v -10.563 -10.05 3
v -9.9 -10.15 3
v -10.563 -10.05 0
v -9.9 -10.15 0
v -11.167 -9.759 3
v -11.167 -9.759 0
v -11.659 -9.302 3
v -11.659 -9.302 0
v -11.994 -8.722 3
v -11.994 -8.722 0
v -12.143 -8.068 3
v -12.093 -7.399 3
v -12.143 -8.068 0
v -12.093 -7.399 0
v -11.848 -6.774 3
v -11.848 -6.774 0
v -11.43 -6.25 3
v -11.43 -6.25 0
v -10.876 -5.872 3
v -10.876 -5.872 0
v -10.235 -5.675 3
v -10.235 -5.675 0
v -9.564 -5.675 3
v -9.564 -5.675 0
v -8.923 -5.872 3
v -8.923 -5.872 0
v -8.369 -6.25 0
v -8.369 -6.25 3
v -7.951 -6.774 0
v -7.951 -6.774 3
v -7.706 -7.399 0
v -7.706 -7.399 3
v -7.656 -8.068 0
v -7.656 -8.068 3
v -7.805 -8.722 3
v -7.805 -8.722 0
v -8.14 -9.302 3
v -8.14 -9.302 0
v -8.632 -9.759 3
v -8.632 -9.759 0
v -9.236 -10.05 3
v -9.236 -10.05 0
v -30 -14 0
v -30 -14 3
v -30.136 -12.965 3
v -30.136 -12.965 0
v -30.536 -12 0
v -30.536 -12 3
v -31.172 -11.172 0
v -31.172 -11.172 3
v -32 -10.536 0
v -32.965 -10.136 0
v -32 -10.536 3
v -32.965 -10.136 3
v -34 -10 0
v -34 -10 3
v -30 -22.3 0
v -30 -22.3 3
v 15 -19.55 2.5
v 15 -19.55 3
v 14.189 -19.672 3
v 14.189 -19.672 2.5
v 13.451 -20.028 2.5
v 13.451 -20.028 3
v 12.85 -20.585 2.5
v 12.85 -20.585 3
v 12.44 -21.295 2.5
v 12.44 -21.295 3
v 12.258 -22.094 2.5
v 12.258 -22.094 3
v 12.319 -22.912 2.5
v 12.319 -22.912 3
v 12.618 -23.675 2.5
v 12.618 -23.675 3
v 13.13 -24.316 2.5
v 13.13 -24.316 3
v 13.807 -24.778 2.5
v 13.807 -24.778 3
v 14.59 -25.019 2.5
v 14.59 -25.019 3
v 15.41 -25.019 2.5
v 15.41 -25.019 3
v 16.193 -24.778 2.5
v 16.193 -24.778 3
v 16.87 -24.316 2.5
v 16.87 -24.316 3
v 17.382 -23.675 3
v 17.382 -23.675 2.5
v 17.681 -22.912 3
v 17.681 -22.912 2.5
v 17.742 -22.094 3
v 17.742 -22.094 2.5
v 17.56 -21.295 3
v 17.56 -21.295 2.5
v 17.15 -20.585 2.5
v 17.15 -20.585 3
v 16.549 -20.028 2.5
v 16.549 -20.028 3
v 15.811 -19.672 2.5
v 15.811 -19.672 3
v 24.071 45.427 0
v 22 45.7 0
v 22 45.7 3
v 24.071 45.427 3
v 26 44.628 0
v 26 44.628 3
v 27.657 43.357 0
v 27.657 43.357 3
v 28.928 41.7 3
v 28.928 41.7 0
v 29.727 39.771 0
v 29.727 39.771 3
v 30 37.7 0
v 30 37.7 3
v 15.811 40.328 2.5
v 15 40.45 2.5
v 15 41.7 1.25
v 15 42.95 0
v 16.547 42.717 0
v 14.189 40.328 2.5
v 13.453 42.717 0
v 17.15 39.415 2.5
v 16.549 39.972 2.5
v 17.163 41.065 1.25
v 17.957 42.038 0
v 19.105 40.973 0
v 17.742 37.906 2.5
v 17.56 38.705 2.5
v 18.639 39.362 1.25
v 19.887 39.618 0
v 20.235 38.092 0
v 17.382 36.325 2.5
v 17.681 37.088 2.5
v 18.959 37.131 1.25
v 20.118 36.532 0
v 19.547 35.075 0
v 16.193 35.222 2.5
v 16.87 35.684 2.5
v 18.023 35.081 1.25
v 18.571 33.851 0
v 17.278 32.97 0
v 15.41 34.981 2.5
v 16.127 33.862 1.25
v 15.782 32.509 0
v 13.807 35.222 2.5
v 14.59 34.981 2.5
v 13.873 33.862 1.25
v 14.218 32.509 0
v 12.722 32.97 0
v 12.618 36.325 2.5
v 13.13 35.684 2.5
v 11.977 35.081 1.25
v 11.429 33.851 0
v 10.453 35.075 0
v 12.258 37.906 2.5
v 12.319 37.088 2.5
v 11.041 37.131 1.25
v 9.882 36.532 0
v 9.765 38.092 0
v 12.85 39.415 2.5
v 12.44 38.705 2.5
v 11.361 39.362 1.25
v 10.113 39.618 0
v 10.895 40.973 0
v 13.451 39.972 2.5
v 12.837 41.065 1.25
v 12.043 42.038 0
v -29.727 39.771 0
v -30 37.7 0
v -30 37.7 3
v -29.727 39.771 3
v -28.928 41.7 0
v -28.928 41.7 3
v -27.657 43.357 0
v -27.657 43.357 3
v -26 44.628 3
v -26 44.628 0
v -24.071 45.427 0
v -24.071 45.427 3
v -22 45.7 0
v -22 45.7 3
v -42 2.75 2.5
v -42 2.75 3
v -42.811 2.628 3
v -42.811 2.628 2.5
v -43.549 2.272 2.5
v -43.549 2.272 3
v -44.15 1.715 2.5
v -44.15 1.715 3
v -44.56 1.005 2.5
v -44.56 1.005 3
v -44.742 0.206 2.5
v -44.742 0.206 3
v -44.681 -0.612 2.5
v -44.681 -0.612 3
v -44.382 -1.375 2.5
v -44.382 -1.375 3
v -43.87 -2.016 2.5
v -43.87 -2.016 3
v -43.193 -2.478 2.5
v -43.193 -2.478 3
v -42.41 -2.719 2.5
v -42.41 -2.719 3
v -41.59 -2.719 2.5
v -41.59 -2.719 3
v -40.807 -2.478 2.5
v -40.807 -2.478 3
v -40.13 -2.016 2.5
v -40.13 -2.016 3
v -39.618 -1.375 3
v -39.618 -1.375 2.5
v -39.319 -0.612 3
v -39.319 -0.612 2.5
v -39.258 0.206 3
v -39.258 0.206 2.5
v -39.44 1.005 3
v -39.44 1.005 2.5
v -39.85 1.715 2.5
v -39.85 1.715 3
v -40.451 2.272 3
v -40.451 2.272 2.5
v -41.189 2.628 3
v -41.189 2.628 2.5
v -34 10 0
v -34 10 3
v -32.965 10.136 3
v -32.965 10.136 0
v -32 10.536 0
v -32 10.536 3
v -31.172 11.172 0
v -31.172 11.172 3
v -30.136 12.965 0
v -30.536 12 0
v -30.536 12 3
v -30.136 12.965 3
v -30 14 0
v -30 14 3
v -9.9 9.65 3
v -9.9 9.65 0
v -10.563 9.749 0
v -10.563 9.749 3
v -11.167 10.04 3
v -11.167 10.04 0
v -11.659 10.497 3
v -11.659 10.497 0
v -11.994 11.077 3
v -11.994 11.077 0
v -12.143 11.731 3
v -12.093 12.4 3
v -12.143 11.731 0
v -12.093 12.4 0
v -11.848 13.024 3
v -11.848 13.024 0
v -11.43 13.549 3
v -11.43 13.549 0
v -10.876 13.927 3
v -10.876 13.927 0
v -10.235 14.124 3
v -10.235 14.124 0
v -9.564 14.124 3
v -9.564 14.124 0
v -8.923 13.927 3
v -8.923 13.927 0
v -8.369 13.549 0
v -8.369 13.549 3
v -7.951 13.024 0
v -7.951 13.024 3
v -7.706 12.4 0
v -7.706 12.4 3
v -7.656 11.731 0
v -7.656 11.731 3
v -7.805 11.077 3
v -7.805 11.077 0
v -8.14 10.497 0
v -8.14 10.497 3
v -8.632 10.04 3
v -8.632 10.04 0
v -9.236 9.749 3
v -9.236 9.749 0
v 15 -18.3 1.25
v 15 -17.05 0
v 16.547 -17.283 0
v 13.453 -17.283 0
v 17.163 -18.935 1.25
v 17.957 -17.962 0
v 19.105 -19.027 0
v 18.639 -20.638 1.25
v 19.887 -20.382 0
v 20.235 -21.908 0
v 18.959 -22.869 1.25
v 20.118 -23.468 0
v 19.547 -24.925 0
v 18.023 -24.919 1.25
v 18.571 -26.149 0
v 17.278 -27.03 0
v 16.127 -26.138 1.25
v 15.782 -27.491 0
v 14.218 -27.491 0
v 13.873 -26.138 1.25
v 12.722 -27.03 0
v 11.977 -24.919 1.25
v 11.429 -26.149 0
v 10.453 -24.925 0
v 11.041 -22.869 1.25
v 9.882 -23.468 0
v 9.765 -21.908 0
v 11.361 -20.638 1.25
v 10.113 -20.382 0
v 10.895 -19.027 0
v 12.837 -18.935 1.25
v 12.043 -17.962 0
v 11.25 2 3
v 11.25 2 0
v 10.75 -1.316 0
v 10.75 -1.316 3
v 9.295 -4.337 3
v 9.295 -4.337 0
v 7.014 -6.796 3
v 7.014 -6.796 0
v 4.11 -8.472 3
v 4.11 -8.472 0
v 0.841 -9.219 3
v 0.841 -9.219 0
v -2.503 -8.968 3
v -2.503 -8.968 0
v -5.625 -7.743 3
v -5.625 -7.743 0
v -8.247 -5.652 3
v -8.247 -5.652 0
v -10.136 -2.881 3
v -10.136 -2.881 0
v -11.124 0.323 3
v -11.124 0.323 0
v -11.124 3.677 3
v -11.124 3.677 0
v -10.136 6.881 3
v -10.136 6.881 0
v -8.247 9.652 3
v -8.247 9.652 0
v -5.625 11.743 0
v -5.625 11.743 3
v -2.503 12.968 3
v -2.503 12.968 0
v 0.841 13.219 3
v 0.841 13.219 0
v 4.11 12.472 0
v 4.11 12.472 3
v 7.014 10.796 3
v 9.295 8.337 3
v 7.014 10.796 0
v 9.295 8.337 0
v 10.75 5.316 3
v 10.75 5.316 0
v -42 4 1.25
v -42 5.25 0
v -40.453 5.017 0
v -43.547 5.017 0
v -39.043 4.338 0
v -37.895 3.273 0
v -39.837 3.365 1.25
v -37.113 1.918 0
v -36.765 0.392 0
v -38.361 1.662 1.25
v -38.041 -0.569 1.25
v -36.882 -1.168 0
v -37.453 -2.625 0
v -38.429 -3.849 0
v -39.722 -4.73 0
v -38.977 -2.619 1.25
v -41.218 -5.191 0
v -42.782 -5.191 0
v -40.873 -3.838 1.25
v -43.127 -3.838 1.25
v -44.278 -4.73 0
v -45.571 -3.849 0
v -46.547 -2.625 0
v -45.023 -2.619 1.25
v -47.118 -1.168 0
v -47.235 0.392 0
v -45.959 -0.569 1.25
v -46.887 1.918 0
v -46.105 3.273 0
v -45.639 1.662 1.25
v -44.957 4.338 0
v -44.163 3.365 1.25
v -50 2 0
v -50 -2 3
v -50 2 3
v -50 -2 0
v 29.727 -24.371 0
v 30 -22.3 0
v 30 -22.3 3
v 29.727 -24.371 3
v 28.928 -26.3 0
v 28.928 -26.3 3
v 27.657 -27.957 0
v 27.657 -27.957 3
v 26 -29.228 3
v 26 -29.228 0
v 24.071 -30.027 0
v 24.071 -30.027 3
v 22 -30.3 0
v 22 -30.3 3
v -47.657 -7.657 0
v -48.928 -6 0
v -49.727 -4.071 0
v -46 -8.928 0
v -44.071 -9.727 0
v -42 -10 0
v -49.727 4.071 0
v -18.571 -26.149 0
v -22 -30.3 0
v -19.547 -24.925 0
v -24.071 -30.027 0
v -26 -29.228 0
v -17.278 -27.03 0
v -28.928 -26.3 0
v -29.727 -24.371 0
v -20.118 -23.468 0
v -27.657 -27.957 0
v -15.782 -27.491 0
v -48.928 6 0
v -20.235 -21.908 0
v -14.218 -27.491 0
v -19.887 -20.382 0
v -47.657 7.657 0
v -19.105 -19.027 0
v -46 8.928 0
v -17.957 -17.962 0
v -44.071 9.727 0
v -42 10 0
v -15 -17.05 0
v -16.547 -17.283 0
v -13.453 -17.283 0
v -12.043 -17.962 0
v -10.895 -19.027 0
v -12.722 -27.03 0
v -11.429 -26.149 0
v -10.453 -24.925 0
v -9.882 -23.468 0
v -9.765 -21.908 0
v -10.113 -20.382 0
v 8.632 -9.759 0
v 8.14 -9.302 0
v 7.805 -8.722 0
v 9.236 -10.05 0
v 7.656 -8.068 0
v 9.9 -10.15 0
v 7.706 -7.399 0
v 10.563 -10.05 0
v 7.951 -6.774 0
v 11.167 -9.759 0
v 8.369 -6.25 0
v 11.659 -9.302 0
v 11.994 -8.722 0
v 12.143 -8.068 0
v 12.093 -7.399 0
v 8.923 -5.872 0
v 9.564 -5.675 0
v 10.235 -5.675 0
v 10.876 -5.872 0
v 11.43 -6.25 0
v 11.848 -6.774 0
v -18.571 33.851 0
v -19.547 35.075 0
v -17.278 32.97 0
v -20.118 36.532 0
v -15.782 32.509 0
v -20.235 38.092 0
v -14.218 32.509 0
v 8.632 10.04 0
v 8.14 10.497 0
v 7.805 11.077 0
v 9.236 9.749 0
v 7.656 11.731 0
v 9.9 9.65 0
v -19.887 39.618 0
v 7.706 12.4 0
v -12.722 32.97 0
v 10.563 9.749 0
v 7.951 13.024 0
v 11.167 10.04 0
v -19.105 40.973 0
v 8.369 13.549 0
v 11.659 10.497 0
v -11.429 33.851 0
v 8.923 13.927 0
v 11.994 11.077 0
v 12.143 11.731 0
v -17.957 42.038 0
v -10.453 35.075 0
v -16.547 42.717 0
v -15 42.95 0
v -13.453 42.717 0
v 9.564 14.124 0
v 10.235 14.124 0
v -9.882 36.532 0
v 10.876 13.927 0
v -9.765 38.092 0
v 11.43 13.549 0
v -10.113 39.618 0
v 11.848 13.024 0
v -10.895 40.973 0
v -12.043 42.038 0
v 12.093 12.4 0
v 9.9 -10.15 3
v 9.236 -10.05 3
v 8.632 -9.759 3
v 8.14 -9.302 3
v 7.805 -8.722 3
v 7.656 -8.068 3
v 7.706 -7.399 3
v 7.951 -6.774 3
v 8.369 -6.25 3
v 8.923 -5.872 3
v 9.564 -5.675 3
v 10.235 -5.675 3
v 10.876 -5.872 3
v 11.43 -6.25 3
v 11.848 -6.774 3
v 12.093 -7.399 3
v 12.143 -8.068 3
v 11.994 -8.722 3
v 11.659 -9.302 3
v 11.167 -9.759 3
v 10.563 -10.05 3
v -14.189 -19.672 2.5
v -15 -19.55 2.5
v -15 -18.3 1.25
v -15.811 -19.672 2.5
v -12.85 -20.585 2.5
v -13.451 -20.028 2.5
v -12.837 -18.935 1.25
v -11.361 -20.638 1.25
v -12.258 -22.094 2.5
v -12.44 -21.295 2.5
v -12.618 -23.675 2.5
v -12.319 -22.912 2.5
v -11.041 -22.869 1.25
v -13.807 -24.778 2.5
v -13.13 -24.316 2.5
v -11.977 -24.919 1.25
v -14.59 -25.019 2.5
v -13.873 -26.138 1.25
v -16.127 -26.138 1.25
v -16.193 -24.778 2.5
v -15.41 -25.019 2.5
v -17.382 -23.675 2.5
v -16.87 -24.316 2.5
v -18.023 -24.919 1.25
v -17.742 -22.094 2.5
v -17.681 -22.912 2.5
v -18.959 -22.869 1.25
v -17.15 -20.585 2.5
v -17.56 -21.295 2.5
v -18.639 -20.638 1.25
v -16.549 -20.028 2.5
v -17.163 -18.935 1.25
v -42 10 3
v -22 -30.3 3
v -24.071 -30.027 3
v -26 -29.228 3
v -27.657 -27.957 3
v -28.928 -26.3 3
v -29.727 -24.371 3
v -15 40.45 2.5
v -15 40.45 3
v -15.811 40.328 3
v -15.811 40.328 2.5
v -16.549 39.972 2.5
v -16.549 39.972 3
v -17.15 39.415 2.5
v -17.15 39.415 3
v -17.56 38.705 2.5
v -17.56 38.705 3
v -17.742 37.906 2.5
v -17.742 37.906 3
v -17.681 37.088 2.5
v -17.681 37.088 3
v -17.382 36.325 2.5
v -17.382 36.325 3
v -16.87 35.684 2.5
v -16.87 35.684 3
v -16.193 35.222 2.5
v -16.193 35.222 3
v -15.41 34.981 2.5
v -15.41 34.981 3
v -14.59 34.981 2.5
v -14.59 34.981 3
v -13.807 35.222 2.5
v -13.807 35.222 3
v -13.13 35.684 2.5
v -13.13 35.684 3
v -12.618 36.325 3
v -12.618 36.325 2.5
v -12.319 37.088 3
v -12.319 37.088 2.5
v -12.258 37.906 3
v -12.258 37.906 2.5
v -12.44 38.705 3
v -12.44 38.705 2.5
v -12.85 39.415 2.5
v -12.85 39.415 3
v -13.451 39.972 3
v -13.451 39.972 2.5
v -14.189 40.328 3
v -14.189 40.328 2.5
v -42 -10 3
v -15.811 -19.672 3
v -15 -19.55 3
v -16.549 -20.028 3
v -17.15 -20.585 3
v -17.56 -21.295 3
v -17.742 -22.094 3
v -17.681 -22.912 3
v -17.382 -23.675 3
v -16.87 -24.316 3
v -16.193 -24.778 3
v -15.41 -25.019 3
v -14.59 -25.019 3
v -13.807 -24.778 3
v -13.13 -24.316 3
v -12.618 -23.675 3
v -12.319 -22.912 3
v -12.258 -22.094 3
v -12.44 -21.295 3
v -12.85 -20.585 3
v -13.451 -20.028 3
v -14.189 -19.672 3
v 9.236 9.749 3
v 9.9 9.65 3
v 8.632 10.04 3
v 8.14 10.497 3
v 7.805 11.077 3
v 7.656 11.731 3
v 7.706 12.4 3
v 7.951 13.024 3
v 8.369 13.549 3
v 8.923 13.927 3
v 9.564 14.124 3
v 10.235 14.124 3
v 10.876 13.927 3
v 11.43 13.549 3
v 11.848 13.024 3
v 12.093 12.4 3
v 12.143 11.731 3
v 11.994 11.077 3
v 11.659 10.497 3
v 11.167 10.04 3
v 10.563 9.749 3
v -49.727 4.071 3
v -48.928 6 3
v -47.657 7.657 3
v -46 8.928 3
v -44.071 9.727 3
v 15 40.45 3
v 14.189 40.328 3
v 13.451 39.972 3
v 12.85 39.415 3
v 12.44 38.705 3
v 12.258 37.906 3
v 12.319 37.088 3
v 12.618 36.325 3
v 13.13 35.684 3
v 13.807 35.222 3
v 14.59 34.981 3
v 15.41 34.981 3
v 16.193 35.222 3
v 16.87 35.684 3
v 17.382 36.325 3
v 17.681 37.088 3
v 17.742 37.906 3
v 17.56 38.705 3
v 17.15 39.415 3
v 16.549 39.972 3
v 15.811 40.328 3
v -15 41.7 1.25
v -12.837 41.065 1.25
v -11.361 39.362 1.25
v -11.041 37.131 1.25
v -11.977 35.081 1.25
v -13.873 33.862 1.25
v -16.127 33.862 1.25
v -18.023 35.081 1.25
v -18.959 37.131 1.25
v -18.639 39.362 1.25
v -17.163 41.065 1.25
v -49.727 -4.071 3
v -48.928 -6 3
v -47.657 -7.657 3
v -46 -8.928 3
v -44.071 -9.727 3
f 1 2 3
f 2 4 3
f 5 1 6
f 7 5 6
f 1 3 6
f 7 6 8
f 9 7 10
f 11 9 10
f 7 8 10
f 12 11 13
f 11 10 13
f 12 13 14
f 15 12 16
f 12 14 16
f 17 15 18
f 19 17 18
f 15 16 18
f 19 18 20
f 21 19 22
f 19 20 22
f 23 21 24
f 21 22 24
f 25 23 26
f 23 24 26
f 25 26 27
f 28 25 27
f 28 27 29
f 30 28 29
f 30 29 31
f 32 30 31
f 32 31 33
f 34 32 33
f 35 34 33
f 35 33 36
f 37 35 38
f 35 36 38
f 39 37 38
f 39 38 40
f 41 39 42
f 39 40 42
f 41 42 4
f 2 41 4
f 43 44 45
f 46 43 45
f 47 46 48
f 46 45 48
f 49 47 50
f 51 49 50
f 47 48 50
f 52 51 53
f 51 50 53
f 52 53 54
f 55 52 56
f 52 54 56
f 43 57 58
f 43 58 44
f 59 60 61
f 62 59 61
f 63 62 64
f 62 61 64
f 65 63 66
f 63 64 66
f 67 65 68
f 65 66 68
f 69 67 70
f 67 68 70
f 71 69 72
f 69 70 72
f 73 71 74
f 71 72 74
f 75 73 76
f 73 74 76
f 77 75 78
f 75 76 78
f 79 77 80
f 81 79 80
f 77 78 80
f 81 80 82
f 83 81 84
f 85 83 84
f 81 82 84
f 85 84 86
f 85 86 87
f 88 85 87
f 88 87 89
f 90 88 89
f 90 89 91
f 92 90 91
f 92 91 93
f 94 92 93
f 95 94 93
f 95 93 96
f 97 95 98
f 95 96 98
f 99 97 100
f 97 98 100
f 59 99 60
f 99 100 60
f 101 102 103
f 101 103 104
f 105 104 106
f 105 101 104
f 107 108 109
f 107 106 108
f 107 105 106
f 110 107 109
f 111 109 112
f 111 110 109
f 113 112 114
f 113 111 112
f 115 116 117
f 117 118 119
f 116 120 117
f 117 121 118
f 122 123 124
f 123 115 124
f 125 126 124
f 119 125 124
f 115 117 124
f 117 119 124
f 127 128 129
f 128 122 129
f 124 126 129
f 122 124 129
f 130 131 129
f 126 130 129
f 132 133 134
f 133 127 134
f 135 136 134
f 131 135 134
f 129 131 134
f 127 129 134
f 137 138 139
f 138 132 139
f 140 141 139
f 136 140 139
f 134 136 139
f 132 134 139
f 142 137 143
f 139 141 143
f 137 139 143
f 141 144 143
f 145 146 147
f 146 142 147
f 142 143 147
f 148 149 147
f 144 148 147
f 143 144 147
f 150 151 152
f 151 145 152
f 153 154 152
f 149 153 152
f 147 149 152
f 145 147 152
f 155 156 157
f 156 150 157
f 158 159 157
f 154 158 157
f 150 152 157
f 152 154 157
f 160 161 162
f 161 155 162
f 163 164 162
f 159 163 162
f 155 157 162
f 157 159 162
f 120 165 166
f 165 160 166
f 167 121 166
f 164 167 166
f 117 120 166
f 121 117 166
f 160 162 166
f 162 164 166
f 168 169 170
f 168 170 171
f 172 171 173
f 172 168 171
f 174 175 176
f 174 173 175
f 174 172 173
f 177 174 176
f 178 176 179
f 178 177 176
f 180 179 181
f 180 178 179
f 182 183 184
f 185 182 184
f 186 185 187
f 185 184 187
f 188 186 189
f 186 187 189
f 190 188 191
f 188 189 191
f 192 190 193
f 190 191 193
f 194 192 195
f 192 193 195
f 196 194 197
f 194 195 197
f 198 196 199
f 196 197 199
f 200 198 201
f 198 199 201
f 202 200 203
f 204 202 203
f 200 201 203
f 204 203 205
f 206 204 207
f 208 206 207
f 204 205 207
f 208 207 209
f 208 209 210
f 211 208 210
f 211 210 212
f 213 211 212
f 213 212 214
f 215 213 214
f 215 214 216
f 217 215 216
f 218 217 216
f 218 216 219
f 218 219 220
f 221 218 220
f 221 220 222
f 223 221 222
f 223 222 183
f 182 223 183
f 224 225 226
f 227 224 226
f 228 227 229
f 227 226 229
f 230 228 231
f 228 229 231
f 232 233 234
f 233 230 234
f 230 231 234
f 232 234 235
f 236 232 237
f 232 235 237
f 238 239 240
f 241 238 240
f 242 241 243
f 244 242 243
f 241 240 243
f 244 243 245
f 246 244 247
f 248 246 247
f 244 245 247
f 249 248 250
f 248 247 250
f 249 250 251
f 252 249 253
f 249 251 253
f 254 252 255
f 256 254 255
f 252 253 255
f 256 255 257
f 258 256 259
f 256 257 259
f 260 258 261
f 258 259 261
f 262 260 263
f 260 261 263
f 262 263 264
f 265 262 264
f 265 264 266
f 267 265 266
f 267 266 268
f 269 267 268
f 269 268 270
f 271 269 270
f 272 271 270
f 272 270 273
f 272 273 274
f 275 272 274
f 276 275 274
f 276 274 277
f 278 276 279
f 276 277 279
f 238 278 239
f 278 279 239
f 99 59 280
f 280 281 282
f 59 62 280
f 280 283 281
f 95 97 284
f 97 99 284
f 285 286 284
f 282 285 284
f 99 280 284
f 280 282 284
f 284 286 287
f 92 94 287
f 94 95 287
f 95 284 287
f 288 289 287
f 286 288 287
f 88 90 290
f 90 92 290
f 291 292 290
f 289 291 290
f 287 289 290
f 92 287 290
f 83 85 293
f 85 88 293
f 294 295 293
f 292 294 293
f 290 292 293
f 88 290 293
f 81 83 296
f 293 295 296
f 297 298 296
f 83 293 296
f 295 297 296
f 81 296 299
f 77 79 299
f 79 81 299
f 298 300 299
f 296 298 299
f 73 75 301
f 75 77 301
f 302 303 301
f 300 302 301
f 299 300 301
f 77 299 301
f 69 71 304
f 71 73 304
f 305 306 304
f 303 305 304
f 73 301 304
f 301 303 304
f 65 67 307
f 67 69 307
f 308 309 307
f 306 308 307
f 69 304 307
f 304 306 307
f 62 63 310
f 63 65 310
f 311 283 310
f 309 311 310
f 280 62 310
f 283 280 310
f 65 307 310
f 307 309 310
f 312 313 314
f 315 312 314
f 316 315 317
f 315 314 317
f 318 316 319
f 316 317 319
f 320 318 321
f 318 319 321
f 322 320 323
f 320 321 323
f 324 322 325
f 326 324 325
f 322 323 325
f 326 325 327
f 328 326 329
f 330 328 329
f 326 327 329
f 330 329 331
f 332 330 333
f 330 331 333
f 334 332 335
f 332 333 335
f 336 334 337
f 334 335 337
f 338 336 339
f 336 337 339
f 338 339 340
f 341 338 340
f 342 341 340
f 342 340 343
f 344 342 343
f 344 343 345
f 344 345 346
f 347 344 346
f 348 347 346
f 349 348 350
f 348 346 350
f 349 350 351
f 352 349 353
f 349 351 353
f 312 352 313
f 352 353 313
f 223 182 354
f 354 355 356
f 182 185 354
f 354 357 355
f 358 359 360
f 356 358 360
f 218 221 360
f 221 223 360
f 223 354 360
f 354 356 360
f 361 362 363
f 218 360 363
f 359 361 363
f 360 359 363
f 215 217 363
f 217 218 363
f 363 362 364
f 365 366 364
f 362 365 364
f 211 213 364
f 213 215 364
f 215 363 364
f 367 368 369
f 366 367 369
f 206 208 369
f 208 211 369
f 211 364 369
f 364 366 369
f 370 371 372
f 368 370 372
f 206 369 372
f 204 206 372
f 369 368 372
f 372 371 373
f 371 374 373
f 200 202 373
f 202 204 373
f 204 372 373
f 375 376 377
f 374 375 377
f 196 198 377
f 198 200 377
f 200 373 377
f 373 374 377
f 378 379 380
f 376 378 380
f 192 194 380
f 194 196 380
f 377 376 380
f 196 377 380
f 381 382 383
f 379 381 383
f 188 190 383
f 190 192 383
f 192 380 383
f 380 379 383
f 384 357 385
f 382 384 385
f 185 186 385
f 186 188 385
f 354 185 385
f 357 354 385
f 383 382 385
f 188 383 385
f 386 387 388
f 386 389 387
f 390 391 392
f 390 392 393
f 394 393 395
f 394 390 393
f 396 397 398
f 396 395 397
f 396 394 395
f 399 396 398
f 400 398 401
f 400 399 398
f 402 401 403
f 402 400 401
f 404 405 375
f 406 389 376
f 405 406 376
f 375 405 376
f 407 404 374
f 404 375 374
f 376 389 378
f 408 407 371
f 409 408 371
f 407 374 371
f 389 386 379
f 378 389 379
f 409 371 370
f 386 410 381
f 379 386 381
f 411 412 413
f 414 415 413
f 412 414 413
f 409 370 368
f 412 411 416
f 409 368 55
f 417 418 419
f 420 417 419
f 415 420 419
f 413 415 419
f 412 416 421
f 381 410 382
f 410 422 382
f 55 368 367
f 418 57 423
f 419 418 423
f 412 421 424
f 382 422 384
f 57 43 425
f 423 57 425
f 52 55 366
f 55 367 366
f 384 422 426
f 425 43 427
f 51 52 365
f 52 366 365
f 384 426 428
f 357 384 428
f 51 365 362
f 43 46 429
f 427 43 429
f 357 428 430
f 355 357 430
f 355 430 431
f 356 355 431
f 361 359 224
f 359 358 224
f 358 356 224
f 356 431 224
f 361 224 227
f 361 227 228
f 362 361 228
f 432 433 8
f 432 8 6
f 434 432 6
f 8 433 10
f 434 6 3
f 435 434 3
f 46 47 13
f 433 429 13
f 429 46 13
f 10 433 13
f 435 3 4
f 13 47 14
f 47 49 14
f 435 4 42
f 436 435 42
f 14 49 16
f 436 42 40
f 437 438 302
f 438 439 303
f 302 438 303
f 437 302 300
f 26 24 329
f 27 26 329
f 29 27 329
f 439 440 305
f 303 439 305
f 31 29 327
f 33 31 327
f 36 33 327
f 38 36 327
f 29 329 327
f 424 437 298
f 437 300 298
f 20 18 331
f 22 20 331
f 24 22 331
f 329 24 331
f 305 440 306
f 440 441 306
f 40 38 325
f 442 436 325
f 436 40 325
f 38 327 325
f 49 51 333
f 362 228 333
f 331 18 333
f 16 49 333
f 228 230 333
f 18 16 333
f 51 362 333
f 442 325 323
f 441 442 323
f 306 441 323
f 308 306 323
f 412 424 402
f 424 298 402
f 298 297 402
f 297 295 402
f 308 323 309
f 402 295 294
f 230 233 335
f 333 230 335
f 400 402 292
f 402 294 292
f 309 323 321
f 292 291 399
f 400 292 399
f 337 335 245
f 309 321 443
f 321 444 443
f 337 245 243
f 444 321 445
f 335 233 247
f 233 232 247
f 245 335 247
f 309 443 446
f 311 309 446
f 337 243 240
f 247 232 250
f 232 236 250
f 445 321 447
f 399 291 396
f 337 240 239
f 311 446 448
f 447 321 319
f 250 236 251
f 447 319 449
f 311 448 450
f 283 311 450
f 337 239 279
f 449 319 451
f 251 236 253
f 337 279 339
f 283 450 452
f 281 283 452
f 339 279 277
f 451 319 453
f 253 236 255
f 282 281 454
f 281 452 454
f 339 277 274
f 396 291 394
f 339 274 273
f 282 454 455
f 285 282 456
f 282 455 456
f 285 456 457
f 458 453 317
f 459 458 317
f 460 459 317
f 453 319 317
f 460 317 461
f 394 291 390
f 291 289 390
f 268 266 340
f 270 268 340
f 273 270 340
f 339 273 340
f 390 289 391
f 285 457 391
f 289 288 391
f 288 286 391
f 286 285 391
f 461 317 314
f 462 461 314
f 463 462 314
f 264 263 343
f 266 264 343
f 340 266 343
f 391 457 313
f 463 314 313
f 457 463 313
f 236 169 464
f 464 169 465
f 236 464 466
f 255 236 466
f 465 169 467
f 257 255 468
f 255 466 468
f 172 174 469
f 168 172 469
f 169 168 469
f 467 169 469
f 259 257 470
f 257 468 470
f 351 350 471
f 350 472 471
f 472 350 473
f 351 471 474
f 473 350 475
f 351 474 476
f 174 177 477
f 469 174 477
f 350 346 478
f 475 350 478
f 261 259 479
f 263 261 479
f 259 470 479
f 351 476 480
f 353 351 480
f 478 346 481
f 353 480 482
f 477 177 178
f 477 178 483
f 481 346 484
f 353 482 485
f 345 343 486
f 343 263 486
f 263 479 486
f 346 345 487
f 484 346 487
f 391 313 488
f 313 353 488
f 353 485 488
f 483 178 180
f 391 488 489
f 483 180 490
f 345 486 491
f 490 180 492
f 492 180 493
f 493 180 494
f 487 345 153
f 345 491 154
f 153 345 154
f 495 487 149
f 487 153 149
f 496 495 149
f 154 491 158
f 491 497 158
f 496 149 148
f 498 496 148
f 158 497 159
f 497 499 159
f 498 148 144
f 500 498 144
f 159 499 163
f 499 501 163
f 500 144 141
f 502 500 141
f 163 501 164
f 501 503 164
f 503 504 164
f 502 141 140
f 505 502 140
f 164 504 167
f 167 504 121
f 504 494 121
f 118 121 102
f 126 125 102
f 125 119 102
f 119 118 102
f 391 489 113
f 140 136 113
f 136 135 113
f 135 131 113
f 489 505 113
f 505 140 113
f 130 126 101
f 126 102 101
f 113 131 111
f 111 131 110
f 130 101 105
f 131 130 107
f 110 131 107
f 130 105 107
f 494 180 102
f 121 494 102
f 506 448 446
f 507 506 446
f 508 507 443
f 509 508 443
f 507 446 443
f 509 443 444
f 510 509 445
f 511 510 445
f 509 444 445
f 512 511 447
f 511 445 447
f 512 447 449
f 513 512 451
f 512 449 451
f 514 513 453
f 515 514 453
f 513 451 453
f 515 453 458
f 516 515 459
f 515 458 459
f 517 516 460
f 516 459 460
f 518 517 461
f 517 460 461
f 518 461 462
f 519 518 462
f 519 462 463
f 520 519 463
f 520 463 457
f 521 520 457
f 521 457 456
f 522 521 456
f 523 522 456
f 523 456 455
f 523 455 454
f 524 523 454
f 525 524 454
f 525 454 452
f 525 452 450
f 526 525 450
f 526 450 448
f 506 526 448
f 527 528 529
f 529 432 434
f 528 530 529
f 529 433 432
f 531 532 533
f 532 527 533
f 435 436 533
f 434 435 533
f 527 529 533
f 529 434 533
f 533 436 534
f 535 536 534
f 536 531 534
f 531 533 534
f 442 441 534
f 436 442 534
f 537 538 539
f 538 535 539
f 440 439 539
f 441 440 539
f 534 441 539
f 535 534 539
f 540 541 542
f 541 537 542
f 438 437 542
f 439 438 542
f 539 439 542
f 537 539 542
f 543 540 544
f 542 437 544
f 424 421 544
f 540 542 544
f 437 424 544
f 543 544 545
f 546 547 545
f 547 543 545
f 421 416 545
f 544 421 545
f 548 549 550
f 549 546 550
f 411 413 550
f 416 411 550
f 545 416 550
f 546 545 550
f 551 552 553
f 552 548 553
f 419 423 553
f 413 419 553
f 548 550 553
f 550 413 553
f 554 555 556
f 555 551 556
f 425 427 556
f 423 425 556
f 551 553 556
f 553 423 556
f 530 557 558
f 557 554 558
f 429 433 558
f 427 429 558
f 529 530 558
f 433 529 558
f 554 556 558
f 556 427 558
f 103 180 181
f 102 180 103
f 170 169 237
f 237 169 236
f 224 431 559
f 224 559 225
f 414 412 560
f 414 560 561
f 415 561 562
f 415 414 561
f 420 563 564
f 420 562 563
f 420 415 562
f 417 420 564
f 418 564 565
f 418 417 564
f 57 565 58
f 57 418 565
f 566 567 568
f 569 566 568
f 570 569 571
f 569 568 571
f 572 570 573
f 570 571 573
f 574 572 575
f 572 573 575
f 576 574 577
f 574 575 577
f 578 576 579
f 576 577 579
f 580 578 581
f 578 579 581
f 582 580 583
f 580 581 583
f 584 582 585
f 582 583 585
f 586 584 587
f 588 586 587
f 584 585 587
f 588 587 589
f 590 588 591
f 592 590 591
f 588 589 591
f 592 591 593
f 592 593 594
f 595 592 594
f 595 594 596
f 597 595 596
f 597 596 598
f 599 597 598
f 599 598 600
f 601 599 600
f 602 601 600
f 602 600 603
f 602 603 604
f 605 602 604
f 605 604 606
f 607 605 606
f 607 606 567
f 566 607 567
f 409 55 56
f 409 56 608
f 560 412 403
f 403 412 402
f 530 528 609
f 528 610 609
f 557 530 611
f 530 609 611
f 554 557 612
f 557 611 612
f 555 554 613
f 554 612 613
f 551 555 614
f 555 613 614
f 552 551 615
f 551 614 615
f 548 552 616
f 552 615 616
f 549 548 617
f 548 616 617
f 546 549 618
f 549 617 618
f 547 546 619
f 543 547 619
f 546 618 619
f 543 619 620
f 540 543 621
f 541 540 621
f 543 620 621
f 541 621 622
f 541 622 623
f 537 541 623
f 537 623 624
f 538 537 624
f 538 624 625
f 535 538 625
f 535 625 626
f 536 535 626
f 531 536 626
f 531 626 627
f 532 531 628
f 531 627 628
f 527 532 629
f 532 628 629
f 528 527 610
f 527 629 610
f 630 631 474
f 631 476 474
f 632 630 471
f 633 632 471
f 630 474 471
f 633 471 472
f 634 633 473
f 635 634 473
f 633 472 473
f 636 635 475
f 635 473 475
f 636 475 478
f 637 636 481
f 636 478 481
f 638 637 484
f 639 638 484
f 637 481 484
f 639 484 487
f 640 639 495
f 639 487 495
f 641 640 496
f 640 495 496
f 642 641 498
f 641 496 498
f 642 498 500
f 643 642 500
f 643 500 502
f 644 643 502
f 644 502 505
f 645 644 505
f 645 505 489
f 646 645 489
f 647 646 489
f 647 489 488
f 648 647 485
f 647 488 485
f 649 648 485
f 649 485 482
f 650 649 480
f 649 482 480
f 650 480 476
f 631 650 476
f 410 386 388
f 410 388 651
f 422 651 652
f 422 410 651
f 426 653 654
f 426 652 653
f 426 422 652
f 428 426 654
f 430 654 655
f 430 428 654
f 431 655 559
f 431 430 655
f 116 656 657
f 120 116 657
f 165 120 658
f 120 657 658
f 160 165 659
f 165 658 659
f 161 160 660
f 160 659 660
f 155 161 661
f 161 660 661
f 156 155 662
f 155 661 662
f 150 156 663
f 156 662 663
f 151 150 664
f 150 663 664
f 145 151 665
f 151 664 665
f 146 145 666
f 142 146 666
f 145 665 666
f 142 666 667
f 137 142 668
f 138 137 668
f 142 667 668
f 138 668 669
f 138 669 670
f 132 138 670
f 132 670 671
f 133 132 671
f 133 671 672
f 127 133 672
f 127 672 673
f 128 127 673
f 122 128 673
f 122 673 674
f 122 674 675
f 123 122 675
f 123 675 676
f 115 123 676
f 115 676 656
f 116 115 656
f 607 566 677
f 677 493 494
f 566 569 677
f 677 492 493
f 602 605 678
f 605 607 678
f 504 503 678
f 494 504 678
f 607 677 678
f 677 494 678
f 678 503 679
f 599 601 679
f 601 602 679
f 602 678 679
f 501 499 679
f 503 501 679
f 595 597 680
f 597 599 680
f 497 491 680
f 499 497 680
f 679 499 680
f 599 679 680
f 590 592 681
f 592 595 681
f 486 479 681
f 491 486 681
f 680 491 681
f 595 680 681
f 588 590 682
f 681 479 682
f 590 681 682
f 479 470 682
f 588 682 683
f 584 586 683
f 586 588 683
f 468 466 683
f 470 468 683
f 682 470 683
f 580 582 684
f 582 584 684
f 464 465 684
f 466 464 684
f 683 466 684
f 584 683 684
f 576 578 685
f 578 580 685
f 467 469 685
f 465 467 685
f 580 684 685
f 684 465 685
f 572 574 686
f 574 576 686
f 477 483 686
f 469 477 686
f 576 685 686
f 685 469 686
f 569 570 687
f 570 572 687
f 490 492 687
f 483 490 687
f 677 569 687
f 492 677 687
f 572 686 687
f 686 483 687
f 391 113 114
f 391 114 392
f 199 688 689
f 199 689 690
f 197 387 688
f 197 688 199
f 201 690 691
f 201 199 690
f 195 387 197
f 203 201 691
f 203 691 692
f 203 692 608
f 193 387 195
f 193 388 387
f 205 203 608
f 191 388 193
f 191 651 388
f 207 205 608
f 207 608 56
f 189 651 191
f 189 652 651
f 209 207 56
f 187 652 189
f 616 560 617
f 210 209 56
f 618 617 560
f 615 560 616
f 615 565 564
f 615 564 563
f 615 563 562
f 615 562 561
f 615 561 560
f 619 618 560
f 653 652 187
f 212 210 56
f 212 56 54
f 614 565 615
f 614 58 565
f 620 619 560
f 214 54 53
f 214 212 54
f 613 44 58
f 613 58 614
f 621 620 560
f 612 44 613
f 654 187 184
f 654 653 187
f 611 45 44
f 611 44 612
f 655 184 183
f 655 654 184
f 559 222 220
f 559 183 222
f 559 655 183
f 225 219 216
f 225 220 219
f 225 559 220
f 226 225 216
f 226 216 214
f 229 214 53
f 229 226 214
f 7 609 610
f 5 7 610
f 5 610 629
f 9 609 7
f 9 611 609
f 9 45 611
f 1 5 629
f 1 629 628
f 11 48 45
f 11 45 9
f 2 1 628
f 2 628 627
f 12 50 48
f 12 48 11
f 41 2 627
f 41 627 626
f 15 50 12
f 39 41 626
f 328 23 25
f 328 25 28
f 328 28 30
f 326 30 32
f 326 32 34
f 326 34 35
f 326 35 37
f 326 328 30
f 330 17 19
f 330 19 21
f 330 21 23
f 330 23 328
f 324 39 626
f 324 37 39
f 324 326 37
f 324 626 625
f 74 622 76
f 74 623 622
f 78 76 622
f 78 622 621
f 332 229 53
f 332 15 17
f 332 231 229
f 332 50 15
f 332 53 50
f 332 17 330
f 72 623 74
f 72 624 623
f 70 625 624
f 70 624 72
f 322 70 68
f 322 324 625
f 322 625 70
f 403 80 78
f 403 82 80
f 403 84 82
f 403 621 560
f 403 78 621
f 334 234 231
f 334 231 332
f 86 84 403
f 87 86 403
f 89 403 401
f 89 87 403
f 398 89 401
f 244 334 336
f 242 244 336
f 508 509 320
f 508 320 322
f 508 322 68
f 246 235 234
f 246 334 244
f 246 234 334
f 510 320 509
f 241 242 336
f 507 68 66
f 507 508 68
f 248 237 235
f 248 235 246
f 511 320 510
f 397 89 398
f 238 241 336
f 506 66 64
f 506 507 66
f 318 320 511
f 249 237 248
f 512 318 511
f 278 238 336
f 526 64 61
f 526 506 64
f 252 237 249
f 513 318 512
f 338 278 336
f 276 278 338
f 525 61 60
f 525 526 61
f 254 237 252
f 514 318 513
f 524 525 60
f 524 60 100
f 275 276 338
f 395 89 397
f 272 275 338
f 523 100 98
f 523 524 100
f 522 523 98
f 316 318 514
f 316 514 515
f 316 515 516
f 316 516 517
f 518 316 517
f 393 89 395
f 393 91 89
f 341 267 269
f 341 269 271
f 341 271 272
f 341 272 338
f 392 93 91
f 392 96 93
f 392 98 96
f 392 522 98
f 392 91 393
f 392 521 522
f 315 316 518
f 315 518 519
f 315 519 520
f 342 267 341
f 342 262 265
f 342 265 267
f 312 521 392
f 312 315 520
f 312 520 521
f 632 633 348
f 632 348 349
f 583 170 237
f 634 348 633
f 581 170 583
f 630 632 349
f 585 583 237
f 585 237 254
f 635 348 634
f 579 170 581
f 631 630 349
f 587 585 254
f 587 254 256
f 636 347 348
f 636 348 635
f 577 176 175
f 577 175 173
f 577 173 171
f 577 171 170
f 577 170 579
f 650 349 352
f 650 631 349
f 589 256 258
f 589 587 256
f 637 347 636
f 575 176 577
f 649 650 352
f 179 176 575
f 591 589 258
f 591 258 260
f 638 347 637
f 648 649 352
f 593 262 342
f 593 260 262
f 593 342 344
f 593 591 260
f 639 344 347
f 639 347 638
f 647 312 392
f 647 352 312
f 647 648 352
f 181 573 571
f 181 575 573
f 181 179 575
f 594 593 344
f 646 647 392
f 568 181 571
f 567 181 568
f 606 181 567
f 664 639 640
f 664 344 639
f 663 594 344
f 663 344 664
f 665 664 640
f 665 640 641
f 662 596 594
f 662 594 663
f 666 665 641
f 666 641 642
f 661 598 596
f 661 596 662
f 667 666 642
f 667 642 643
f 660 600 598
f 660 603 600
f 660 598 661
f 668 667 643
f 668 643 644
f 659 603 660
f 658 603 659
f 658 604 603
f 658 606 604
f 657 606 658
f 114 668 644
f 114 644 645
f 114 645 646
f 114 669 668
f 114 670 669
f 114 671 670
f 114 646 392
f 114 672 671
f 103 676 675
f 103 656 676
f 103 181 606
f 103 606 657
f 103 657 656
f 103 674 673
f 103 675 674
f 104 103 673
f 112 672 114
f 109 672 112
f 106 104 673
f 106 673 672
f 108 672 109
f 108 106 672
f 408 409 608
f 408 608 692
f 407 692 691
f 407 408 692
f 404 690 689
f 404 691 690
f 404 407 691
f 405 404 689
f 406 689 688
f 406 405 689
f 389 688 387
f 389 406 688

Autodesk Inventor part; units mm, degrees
ref_plane "YZ Plane" through (0, 0, 0) normal (1, 0, 0) x (0, 1, 0)
ref_plane "XZ Plane" through (0, 0, 0) normal (0, 1, 0) x (-1, 0, 0)
ref_plane "XY Plane" through (0, 0, 0) normal (0, 0, 1) x (1, 0, 0)
sketch "Эскиз1" plane through (0, 0, 0) normal (0, 0, 1) x (1, 0, 0)
  line L0 (-1.5933, 45.7) -> (22, 45.7)
  line L1 (30, 37.7) -> (30, 10)
  arc A0 (30, 37.7) -> (22, 45.7) centre (22, 37.7) ccw
  line L2 (-1.5933, 45.7) -> (-22, 45.7)
  arc A1 (-22, 45.7) -> (-30, 37.7) centre (-22, 37.7) ccw
  line L3 (30, -22.3) -> (30, 10)
  line L4 (-30, -22.3) -> (-30, -10)
  line L5 (-72.3196, 0) -> (72.3196, 0) projected
  line L6 (0, -47.8196) -> (0, 63.2196) projected
  circle A2 centre (0, 2) radius 11.25
  circle A3 centre (0, 2) radius 14 construction
  line L7 (0, 2) -> (-9.8995, 11.8995) construction
  line L8 (-22, -30.3) -> (22, -30.3)
  arc A4 (-30, -22.3) -> (-22, -30.3) centre (-22, -22.3) ccw
  arc A5 (22, -30.3) -> (30, -22.3) centre (22, -22.3) ccw
  line L9 (30, -10) -> (42, -10) construction
  line L10 (50, -2) -> (50, 2) construction
  line L11 (42, 10) -> (30, 10) construction
  arc A6 (50, 2) -> (42, 10) centre (42, 2) ccw construction
  arc A7 (42, -10) -> (50, -2) centre (42, -2) ccw construction
  line L12 (-30, -10) -> (-42, -10)
  line L13 (-50, -2) -> (-50, 2)
  line L14 (-42, 10) -> (-30, 10)
  arc A8 (-42, 10) -> (-50, 2) centre (-42, 2) ccw
  arc A9 (-50, -2) -> (-42, -10) centre (-42, -2) ccw
  line L15 (-30, 37.7) -> (-30, 10)
  point P0 (0, 0)
  point P1 (0, 0)
  point P2 (30, -30.3)
  point P3 (-30, -30.3)
  point P4 (15, 37.7)
  point P5 (-15, 37.7)
  point P6 (9.8995, 11.8995)
  point P7 (-9.8995, -7.8995)
  point P8 (9.8995, -7.8995)
  point P9 (15, -22.3)
  point P10 (-15, -22.3)
  point P11 (42, 0)
  point P12 (-42, 0)
  dimension "d128" = 28
  dimension "d43" = 8
  dimension "d50" = 30
  dimension "d127" = 22.5
  dimension "d131" = 360
  dimension "d134" = 45
  dimension "d168" = 8
  dimension "d182" = 2
  dimension "d184" = 37.7
  dimension "d187" = 30
  dimension "d192" = 22.3
  dimension "d193" = 8
  dimension "d196" = 20
  dimension "d197" = 20
  dimension "d199" = 8
  dimension "d201" = 60
  dimension "d202" = 8
extrude "Пластина2" add sketch "Эскиз1" along normal blind 3 contours L0 L6 A2 L5 L13 A8 L14 L15 A1 L2 | L0 A0 L1 L3 L5 A2 L6 | A2 L6 L8 A4 L4 L12 A9 L13 L5 | L5 L3 A5 L8 L6 A2
hole "Отверстие2" at (-42, 0, 0) at (-15, 37.7, 0) at (15, 37.7, 0) at (15, -22.3, 0) at (-15, -22.3, 0) direction (0, 0, 1) diameter 5.5 end through all countersink diameter 10.5 countersink angle 90
sketch "Эскиз6" plane through (0, 0, 3) normal (0, 0, 1) x (1, 0, 0)
  circle A0 centre (0, 2) radius 14 construction
  line L0 (0, -47.8196) -> (0, 63.2196) projected
  line L1 (-72.3196, 0) -> (72.3196, 0) projected
  line L2 (0, 2) -> (9.8995, 11.8995) construction
  point P0 (-9.8995, 11.8995)
  point P1 (-9.8995, -7.8995)
  point P2 (9.8995, -7.8995)
  dimension "d135" = 28
  dimension "d138" = 360
  dimension "d141" = 135
  dimension "d183" = 2
hole "Отверстие3" at (-9.8995, -7.8995, 3) at (9.8995, 11.8995, 3) at (-9.8995, 11.8995, 3) at (9.8995, -7.8995, 3) direction (0, 0, -1) diameter 4.5 end through all
fillet "Сопряжение1" radius 4 2 edges at (-30, 10, 1.5) (-30, -10, 1.5)
equation "\"d18\" = Толщина"
equation "\"Радиус_гибки\" = Толщина"
equation "\"Ширина_просечки\" = Толщина"
equation "\"Глубина_просечки\" = 0.5 * Толщина"
equation "\"Размер_просечки\" = 4 * Толщина"
equation "\"Мин_остаток\" = 2 * Толщина"
equation "\"Радиус_перехода\" = Радиус_гибки"
equation "\"Радиус_Якоби\" = Радиус_гибки"
equation "\"Размер_зазора\" = Толщина"
equation "\"Толщина\" = 3"
properties part number "кронштейн_zerkalo" material "Сталь"
